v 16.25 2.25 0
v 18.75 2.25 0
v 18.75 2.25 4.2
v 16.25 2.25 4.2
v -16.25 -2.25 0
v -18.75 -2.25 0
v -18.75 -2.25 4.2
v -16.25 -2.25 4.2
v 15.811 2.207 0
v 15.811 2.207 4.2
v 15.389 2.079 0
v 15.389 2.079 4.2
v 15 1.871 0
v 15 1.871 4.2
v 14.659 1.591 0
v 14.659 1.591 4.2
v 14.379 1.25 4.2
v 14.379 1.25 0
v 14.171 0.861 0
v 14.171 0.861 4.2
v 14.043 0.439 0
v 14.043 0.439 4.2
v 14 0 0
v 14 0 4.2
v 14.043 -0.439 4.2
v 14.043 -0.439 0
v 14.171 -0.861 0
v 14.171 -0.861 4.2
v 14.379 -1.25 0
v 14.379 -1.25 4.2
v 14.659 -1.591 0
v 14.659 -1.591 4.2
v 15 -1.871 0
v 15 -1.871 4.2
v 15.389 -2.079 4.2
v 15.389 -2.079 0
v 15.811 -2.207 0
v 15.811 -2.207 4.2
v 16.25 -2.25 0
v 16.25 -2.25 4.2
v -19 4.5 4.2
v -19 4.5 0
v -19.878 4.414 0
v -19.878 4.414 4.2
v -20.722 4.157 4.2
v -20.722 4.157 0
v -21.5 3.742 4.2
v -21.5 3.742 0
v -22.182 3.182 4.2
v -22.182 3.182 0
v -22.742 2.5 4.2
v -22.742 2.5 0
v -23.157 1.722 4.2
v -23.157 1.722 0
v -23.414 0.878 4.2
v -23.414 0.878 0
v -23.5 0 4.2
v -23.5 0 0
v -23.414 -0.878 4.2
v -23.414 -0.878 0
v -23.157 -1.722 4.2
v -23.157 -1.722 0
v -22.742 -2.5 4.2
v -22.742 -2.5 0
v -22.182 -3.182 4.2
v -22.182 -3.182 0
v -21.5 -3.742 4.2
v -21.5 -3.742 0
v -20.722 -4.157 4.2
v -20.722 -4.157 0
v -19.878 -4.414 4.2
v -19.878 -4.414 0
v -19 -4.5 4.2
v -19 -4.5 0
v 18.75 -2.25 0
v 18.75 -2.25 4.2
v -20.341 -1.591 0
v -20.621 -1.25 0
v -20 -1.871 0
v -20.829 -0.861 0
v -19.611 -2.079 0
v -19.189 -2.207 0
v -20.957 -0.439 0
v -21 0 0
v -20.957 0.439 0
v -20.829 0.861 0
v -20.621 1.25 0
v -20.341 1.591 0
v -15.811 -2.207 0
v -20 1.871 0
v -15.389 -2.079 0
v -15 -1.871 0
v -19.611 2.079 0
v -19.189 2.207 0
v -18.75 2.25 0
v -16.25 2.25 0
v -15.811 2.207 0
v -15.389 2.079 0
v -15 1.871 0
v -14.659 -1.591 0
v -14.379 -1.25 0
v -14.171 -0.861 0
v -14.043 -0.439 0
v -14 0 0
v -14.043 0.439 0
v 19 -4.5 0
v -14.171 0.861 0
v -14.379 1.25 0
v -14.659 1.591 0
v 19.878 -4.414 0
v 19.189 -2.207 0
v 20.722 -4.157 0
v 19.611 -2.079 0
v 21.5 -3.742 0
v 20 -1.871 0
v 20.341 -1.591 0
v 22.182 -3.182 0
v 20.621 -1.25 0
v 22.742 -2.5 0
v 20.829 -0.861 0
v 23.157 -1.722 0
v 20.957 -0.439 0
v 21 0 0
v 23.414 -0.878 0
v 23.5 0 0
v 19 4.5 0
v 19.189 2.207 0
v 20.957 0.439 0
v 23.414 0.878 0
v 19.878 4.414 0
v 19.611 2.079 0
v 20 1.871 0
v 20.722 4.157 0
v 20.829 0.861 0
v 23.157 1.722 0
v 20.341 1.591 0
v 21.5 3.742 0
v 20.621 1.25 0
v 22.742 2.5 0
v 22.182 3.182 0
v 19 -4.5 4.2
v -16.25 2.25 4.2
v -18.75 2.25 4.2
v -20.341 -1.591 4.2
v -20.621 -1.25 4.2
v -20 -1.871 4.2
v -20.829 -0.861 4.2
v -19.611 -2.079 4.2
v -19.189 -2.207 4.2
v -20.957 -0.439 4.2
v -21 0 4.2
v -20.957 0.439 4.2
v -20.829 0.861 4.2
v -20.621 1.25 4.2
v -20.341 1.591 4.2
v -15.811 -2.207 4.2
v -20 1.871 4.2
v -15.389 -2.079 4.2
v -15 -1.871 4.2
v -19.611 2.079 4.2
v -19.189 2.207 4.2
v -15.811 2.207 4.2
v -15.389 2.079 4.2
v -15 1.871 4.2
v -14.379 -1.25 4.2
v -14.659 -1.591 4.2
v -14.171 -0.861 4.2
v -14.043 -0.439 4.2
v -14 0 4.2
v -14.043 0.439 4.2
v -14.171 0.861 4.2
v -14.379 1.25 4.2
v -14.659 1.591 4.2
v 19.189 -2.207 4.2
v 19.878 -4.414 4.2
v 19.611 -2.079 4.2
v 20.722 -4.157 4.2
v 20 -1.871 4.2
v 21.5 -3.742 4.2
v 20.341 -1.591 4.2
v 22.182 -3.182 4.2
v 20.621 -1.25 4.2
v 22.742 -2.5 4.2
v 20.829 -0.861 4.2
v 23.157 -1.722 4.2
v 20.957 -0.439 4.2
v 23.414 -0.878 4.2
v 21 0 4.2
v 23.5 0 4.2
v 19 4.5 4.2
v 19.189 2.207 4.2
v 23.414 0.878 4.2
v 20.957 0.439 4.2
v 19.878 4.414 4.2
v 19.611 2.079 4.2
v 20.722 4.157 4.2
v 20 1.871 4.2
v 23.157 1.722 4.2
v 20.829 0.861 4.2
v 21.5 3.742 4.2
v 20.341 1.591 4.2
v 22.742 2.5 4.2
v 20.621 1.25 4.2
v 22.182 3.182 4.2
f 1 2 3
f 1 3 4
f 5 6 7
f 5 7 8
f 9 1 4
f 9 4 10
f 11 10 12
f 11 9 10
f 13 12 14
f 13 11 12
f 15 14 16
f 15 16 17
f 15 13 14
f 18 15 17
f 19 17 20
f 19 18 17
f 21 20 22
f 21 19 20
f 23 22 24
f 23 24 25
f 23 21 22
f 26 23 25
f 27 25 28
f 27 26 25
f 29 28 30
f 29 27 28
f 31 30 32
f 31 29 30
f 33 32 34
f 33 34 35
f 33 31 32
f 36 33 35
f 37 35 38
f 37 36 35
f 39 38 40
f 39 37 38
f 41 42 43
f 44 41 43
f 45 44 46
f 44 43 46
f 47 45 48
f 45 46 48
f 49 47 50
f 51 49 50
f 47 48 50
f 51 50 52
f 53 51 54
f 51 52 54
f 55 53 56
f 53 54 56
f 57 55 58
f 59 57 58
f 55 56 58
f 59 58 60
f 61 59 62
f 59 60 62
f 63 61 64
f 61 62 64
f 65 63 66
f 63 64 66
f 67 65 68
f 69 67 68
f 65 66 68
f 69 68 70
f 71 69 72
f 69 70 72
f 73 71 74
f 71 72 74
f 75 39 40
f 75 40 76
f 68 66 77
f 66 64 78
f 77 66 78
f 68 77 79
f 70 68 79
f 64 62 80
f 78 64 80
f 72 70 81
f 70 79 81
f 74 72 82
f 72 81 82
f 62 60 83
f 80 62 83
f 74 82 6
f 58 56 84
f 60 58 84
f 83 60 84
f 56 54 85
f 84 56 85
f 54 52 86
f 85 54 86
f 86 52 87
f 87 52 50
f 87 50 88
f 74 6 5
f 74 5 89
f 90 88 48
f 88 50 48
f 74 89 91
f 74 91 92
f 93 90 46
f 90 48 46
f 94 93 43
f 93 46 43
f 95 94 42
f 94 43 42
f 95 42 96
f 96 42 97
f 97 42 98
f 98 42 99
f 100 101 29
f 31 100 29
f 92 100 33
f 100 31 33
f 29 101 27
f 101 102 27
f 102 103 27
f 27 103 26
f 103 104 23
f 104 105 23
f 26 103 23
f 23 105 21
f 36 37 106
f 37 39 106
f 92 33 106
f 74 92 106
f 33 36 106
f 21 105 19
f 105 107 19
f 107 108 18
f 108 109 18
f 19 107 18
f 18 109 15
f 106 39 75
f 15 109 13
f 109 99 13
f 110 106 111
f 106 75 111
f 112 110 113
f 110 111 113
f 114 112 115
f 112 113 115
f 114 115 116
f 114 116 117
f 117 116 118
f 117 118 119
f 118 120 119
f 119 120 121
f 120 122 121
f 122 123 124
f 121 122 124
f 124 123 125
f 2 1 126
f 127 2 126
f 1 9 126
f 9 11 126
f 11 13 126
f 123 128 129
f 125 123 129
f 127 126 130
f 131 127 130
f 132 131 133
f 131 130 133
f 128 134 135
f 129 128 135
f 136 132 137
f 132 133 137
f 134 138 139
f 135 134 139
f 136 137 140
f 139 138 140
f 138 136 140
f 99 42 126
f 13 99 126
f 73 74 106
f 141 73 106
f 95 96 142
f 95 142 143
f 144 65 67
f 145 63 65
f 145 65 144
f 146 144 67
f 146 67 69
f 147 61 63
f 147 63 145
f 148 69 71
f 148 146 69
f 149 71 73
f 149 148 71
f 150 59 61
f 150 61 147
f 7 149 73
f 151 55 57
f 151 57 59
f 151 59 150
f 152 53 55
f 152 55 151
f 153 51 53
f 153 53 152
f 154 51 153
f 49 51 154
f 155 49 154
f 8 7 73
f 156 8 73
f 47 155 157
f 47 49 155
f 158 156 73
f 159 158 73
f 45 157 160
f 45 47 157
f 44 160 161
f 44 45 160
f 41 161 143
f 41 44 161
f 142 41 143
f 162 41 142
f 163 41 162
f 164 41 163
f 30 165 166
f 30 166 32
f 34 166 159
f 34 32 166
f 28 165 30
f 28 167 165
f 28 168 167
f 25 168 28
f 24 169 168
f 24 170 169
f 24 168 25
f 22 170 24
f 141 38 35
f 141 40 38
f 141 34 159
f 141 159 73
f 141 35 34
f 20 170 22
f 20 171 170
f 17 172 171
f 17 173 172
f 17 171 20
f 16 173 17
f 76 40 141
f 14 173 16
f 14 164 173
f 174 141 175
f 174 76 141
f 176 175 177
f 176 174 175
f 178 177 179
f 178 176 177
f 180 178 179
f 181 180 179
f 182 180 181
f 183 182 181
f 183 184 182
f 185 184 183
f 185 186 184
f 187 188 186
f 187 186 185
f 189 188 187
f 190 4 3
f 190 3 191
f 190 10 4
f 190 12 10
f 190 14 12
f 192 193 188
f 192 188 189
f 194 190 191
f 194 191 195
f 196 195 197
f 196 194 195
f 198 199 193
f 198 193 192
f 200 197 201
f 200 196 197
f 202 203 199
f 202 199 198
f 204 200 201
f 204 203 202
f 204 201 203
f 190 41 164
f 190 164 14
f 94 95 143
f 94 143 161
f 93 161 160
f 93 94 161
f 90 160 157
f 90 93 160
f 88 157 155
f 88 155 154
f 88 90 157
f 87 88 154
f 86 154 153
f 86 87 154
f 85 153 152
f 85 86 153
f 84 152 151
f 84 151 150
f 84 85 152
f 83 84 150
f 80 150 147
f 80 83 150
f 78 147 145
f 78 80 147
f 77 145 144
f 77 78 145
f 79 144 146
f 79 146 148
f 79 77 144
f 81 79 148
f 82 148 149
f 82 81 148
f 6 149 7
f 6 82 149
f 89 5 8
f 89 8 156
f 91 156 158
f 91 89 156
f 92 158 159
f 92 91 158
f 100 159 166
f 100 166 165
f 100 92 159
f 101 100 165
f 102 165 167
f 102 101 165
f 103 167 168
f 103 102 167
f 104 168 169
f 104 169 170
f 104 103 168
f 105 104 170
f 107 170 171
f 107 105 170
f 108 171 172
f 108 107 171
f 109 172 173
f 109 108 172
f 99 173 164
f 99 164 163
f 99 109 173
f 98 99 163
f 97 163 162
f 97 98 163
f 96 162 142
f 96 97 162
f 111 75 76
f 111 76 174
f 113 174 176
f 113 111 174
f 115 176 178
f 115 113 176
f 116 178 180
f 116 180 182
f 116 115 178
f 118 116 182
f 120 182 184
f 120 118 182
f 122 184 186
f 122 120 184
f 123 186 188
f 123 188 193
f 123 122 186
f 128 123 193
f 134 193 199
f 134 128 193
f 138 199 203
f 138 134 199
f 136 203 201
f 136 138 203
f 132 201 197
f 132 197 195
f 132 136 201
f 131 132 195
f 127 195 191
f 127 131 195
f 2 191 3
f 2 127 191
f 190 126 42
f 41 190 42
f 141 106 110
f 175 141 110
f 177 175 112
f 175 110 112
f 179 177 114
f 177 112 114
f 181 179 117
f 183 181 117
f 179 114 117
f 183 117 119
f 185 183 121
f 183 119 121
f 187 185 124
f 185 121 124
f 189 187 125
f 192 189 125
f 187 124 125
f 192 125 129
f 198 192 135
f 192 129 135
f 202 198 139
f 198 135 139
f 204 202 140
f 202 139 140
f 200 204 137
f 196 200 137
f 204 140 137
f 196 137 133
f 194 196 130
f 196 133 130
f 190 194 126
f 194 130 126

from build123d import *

# Parameters (mm, degrees)
SALIENTE_EXTRUIR2_DEPTH = 4.2


with BuildPart() as part:
    # Croquis1 → Saliente-Extruir2 (new body)
    with BuildSketch(Plane.XY):
        with BuildLine():
            Line((19, 4.5), (-19, 4.5))
            ThreePointArc((-19, 4.5), (-23.5, 0), (-19, -4.5))
            Line((-19, -4.5), (19, -4.5))
            ThreePointArc((19, -4.5), (23.5, 0), (19, 4.5))
        make_face()
        with BuildLine():
            Line((18.75, 2.25), (16.25, 2.25))
            ThreePointArc((16.25, 2.25), (14, 0), (16.25, -2.25))
            Line((16.25, -2.25), (18.75, -2.25))
            ThreePointArc((18.75, -2.25), (21, 0), (18.75, 2.25))
        make_face(mode=Mode.SUBTRACT)
        with BuildLine():
            Line((-16.25, 2.25), (-18.75, 2.25))
            ThreePointArc((-18.75, 2.25), (-21, 0), (-18.75, -2.25))
            Line((-18.75, -2.25), (-16.25, -2.25))
            ThreePointArc((-16.25, -2.25), (-14, 0), (-16.25, 2.25))
        make_face(mode=Mode.SUBTRACT)
    extrude(amount=SALIENTE_EXTRUIR2_DEPTH)


solid = part.part
